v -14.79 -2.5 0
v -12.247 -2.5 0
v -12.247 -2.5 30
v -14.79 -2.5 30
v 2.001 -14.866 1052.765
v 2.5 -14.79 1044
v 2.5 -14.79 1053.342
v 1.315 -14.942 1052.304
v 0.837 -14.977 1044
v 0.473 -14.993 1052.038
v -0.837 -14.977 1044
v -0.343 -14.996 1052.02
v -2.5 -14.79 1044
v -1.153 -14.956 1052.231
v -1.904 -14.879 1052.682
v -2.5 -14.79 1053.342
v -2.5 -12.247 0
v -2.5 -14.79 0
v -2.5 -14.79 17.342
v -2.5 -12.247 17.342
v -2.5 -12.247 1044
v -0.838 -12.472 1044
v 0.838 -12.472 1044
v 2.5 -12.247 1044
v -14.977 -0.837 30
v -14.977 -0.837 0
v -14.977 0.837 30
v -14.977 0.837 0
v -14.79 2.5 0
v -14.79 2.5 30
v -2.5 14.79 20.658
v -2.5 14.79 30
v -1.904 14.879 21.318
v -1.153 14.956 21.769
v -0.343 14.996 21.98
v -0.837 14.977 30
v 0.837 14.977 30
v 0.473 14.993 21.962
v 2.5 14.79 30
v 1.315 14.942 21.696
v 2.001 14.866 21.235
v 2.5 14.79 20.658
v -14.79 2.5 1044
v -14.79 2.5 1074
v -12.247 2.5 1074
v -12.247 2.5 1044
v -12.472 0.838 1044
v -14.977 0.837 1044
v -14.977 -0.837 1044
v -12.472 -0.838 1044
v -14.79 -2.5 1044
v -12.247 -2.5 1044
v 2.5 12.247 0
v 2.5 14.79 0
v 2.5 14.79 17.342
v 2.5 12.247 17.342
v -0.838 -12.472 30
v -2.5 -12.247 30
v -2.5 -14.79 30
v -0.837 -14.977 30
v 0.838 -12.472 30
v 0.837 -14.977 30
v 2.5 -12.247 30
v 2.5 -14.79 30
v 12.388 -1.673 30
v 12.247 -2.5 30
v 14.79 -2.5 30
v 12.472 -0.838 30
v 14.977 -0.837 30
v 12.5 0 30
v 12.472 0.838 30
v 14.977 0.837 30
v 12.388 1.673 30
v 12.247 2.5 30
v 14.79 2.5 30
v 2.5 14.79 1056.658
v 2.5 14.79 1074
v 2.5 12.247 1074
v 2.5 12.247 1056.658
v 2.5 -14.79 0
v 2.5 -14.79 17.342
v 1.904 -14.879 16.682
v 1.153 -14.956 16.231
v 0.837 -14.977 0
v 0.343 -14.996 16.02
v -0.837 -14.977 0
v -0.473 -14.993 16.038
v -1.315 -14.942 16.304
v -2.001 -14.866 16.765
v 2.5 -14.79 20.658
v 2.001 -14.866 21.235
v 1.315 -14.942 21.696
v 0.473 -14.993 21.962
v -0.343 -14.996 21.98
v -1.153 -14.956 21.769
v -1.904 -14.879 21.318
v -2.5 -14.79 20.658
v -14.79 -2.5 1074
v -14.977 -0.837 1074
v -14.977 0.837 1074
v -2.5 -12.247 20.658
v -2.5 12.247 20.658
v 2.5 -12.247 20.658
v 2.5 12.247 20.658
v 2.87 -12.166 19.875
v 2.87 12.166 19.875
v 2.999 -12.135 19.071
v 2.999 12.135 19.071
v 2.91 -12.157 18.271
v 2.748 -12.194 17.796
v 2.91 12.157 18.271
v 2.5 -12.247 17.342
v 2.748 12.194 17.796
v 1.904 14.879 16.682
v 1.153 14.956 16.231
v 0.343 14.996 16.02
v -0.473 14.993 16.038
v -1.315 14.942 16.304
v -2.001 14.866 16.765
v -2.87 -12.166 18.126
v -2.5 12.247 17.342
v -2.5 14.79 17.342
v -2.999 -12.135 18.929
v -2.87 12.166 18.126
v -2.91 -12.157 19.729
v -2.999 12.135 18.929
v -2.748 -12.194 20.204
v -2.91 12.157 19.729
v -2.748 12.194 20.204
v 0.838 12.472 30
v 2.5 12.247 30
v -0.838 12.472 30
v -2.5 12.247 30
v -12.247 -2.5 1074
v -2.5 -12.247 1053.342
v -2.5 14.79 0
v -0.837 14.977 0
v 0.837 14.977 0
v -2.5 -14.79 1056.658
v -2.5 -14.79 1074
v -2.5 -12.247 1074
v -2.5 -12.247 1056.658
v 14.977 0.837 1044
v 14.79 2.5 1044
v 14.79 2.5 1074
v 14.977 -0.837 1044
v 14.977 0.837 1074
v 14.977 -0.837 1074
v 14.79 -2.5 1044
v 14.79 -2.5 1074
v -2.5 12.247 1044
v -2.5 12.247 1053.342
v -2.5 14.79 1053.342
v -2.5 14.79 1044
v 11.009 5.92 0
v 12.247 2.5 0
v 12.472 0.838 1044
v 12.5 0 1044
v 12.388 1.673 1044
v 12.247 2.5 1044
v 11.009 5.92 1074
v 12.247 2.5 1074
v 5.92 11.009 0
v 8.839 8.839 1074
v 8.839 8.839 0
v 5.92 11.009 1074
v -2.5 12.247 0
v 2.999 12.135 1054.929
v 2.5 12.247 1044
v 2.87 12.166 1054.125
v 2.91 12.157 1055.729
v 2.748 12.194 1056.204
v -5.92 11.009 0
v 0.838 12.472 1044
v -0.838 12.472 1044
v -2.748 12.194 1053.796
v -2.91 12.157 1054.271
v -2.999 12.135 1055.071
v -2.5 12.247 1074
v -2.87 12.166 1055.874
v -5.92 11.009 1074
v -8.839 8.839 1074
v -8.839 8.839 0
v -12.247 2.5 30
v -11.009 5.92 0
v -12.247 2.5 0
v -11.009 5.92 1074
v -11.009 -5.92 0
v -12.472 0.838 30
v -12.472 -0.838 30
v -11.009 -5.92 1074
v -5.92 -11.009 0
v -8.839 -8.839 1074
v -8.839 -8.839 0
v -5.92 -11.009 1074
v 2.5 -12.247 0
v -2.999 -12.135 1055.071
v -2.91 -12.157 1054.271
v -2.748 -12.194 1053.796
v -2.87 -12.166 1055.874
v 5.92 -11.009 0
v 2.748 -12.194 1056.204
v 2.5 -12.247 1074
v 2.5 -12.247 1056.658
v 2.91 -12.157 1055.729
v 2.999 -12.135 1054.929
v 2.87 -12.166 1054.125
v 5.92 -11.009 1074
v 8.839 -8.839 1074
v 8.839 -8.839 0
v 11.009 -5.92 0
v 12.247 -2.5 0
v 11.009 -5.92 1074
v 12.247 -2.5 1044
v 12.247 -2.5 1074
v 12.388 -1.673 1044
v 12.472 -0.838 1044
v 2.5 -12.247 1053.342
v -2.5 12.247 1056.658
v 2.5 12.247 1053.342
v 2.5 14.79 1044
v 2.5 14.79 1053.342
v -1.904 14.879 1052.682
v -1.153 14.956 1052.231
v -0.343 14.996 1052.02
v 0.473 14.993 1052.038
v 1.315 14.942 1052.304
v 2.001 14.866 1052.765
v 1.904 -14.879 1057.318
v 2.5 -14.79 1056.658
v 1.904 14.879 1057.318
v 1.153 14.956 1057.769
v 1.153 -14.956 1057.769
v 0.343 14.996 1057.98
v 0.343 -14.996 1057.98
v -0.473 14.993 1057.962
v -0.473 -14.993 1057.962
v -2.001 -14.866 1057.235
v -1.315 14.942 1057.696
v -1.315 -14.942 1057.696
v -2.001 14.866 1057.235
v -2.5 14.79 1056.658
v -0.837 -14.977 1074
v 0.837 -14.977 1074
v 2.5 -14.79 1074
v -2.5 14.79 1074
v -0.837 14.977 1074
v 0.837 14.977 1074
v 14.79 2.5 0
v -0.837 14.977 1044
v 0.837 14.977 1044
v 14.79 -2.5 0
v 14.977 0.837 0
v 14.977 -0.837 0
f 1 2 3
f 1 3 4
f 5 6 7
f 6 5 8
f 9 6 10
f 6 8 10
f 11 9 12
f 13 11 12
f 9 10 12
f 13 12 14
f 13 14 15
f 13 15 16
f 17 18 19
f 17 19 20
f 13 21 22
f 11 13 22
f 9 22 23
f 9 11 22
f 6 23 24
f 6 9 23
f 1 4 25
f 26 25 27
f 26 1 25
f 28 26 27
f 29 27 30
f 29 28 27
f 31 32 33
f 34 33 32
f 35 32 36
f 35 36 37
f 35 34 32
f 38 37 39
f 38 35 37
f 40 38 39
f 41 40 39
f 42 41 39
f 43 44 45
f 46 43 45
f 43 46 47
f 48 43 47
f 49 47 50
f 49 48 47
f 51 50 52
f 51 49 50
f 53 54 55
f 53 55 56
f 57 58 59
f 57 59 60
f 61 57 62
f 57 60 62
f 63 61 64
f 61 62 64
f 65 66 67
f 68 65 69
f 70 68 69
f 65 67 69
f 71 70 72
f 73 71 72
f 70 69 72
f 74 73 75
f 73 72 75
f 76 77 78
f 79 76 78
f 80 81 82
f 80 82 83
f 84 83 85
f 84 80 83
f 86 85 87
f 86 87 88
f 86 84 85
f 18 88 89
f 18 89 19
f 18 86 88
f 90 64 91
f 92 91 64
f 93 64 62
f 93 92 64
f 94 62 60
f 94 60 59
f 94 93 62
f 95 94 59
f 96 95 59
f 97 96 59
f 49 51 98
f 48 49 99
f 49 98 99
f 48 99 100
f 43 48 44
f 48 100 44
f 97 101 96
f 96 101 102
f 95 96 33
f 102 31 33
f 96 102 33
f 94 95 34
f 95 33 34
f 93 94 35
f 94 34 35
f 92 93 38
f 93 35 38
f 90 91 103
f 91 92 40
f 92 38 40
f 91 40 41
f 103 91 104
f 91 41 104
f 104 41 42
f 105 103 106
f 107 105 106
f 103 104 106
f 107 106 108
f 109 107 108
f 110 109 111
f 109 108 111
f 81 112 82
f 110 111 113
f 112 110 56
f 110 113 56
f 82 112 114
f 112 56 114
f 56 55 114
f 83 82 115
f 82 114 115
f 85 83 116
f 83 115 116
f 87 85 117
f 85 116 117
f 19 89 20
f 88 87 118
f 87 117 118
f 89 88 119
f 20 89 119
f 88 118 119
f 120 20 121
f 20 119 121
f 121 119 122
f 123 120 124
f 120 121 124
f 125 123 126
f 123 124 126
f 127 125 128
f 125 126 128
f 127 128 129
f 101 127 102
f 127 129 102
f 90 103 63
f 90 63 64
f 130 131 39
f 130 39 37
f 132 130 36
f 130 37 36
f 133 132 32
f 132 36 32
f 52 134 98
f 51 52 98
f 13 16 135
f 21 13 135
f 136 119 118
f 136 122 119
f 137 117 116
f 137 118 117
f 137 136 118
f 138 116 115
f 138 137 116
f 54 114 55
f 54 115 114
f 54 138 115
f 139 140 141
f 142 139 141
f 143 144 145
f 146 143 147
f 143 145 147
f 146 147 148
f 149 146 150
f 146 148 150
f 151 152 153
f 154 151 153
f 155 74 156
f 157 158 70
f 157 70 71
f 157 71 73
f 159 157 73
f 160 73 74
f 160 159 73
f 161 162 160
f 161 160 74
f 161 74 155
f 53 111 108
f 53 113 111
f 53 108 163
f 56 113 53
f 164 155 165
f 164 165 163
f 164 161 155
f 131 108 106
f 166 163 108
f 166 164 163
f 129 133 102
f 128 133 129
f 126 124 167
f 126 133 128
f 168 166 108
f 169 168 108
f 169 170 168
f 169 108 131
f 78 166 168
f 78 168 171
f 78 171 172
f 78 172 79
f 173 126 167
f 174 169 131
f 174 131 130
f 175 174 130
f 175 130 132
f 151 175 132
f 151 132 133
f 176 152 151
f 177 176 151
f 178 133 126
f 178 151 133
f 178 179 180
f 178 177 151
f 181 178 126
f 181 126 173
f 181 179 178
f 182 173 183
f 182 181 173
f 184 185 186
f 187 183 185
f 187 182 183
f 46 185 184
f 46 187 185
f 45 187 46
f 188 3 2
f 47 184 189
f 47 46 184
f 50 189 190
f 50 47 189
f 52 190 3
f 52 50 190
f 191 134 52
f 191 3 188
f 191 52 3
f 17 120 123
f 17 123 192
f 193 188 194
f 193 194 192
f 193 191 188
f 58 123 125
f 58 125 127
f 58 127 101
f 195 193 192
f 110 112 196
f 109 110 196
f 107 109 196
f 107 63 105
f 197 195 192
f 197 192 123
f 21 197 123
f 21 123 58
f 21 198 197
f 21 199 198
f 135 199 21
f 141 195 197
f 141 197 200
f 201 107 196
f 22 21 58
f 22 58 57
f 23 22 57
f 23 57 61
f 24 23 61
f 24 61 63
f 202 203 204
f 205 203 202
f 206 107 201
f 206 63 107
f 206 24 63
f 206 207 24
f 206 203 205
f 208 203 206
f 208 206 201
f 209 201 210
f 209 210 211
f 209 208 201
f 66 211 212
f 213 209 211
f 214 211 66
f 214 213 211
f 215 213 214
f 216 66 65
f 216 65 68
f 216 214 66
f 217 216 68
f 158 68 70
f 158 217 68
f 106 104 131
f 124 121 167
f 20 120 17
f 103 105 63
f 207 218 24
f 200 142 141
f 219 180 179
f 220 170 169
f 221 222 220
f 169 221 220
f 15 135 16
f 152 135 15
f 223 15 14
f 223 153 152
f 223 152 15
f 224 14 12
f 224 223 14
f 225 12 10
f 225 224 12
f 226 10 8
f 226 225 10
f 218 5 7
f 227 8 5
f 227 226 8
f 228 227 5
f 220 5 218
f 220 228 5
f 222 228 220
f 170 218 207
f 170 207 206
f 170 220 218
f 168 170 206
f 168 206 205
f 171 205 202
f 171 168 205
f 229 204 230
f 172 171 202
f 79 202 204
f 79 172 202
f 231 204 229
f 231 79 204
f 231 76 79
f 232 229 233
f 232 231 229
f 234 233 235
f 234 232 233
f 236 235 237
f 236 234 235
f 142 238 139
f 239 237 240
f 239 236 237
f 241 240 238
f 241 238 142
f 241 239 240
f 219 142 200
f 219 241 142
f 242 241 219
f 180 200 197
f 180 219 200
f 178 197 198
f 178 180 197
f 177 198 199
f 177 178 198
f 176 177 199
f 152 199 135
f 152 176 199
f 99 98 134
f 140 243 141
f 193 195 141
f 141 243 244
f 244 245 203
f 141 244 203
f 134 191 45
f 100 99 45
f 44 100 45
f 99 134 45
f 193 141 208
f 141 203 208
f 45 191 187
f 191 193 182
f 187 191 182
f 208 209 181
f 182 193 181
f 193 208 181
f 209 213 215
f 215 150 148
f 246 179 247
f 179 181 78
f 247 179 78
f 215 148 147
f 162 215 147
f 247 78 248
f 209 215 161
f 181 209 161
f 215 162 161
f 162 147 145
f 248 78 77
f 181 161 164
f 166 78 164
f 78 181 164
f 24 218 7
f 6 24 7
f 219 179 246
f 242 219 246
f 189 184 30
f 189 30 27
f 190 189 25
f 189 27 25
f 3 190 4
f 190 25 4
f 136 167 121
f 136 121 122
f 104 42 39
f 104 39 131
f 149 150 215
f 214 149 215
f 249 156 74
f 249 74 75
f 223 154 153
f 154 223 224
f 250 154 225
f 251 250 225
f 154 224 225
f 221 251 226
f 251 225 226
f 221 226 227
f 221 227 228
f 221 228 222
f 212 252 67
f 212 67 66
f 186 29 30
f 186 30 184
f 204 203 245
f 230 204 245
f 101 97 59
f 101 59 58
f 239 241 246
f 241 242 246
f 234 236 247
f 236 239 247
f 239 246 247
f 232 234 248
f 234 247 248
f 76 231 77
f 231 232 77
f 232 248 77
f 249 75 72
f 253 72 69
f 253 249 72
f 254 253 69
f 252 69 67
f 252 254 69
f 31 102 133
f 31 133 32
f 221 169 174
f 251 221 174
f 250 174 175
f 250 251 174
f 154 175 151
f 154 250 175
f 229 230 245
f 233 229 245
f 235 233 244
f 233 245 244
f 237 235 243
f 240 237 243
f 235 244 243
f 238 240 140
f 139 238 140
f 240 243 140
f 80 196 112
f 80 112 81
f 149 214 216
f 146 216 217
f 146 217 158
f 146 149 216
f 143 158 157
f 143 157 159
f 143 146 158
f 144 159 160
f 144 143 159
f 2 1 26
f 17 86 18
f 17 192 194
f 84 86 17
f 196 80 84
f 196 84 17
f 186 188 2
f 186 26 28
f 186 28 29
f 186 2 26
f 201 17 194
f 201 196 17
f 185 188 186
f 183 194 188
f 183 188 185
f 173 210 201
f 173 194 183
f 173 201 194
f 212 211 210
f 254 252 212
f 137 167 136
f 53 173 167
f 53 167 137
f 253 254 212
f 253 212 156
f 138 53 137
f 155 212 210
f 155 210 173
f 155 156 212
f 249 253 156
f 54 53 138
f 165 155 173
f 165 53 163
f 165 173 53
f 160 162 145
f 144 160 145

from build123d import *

# Parameters (mm, degrees)
SKETCH1_R           = 12.5
BOSS_EXTRUDE1_DEPTH = 537
BOSS_EXTRUDE2_DEPTH = 30
CIRPATTERN1_COUNT   = 4
SKETCH4_R           = 3
CUT_EXTRUDE1_DEPTH  = 538.418831081


# Read off the part's stored shape, not the designer's step: Mirror1
with BuildPart() as part:
    # Sketch1 → Boss-Extrude1 (new body)
    with BuildSketch(Plane.XY):
        Circle(SKETCH1_R)
    extrude(amount=BOSS_EXTRUDE1_DEPTH)

    # Sketch3 → Boss-Extrude2 (add)
    with BuildSketch(Plane(origin=(0, 0, 0), x_dir=(-1, 0, 0), z_dir=(0, 0, -1))):
        with BuildLine():
            Line((-2.5, 14.790199458), (-2.5, 12.247448714))
            ThreePointArc((-2.5, 12.247448714), (0, 12.5), (2.5, 12.247448714))
            Line((2.5, 12.247448714), (2.5, 14.790199458))
            ThreePointArc((2.5, 14.790199458), (0, 15), (-2.5, 14.790199458))
        make_face()
    boss_extrude2 = extrude(amount=-BOSS_EXTRUDE2_DEPTH)

    # CirPattern1: Boss-Extrude2 ×4 about axis
    cirpattern1_axis = Axis((0, 0, 0), (0, 0, 1))
    for i in range(1, CIRPATTERN1_COUNT):
        add(boss_extrude2.rotate(cirpattern1_axis, i * 360 / CIRPATTERN1_COUNT))

    # Sketch4 → Cut-Extrude1 (cut, symmetric)
    with BuildSketch(Plane(origin=(0, 0, 0), x_dir=(1, 0, 0), z_dir=(0, 1, 0))):
        with Locations(Location((0, -19, 0), (0, 0, 213.557309762))):
            Circle(SKETCH4_R)
    extrude(amount=CUT_EXTRUDE1_DEPTH, both=True, mode=Mode.SUBTRACT)

    # Mirror1: part across plane


with BuildPart() as part_1:
    add(part.part)
    add(part.part.mirror(Plane.XY.offset(537)))


solid = part_1.part
